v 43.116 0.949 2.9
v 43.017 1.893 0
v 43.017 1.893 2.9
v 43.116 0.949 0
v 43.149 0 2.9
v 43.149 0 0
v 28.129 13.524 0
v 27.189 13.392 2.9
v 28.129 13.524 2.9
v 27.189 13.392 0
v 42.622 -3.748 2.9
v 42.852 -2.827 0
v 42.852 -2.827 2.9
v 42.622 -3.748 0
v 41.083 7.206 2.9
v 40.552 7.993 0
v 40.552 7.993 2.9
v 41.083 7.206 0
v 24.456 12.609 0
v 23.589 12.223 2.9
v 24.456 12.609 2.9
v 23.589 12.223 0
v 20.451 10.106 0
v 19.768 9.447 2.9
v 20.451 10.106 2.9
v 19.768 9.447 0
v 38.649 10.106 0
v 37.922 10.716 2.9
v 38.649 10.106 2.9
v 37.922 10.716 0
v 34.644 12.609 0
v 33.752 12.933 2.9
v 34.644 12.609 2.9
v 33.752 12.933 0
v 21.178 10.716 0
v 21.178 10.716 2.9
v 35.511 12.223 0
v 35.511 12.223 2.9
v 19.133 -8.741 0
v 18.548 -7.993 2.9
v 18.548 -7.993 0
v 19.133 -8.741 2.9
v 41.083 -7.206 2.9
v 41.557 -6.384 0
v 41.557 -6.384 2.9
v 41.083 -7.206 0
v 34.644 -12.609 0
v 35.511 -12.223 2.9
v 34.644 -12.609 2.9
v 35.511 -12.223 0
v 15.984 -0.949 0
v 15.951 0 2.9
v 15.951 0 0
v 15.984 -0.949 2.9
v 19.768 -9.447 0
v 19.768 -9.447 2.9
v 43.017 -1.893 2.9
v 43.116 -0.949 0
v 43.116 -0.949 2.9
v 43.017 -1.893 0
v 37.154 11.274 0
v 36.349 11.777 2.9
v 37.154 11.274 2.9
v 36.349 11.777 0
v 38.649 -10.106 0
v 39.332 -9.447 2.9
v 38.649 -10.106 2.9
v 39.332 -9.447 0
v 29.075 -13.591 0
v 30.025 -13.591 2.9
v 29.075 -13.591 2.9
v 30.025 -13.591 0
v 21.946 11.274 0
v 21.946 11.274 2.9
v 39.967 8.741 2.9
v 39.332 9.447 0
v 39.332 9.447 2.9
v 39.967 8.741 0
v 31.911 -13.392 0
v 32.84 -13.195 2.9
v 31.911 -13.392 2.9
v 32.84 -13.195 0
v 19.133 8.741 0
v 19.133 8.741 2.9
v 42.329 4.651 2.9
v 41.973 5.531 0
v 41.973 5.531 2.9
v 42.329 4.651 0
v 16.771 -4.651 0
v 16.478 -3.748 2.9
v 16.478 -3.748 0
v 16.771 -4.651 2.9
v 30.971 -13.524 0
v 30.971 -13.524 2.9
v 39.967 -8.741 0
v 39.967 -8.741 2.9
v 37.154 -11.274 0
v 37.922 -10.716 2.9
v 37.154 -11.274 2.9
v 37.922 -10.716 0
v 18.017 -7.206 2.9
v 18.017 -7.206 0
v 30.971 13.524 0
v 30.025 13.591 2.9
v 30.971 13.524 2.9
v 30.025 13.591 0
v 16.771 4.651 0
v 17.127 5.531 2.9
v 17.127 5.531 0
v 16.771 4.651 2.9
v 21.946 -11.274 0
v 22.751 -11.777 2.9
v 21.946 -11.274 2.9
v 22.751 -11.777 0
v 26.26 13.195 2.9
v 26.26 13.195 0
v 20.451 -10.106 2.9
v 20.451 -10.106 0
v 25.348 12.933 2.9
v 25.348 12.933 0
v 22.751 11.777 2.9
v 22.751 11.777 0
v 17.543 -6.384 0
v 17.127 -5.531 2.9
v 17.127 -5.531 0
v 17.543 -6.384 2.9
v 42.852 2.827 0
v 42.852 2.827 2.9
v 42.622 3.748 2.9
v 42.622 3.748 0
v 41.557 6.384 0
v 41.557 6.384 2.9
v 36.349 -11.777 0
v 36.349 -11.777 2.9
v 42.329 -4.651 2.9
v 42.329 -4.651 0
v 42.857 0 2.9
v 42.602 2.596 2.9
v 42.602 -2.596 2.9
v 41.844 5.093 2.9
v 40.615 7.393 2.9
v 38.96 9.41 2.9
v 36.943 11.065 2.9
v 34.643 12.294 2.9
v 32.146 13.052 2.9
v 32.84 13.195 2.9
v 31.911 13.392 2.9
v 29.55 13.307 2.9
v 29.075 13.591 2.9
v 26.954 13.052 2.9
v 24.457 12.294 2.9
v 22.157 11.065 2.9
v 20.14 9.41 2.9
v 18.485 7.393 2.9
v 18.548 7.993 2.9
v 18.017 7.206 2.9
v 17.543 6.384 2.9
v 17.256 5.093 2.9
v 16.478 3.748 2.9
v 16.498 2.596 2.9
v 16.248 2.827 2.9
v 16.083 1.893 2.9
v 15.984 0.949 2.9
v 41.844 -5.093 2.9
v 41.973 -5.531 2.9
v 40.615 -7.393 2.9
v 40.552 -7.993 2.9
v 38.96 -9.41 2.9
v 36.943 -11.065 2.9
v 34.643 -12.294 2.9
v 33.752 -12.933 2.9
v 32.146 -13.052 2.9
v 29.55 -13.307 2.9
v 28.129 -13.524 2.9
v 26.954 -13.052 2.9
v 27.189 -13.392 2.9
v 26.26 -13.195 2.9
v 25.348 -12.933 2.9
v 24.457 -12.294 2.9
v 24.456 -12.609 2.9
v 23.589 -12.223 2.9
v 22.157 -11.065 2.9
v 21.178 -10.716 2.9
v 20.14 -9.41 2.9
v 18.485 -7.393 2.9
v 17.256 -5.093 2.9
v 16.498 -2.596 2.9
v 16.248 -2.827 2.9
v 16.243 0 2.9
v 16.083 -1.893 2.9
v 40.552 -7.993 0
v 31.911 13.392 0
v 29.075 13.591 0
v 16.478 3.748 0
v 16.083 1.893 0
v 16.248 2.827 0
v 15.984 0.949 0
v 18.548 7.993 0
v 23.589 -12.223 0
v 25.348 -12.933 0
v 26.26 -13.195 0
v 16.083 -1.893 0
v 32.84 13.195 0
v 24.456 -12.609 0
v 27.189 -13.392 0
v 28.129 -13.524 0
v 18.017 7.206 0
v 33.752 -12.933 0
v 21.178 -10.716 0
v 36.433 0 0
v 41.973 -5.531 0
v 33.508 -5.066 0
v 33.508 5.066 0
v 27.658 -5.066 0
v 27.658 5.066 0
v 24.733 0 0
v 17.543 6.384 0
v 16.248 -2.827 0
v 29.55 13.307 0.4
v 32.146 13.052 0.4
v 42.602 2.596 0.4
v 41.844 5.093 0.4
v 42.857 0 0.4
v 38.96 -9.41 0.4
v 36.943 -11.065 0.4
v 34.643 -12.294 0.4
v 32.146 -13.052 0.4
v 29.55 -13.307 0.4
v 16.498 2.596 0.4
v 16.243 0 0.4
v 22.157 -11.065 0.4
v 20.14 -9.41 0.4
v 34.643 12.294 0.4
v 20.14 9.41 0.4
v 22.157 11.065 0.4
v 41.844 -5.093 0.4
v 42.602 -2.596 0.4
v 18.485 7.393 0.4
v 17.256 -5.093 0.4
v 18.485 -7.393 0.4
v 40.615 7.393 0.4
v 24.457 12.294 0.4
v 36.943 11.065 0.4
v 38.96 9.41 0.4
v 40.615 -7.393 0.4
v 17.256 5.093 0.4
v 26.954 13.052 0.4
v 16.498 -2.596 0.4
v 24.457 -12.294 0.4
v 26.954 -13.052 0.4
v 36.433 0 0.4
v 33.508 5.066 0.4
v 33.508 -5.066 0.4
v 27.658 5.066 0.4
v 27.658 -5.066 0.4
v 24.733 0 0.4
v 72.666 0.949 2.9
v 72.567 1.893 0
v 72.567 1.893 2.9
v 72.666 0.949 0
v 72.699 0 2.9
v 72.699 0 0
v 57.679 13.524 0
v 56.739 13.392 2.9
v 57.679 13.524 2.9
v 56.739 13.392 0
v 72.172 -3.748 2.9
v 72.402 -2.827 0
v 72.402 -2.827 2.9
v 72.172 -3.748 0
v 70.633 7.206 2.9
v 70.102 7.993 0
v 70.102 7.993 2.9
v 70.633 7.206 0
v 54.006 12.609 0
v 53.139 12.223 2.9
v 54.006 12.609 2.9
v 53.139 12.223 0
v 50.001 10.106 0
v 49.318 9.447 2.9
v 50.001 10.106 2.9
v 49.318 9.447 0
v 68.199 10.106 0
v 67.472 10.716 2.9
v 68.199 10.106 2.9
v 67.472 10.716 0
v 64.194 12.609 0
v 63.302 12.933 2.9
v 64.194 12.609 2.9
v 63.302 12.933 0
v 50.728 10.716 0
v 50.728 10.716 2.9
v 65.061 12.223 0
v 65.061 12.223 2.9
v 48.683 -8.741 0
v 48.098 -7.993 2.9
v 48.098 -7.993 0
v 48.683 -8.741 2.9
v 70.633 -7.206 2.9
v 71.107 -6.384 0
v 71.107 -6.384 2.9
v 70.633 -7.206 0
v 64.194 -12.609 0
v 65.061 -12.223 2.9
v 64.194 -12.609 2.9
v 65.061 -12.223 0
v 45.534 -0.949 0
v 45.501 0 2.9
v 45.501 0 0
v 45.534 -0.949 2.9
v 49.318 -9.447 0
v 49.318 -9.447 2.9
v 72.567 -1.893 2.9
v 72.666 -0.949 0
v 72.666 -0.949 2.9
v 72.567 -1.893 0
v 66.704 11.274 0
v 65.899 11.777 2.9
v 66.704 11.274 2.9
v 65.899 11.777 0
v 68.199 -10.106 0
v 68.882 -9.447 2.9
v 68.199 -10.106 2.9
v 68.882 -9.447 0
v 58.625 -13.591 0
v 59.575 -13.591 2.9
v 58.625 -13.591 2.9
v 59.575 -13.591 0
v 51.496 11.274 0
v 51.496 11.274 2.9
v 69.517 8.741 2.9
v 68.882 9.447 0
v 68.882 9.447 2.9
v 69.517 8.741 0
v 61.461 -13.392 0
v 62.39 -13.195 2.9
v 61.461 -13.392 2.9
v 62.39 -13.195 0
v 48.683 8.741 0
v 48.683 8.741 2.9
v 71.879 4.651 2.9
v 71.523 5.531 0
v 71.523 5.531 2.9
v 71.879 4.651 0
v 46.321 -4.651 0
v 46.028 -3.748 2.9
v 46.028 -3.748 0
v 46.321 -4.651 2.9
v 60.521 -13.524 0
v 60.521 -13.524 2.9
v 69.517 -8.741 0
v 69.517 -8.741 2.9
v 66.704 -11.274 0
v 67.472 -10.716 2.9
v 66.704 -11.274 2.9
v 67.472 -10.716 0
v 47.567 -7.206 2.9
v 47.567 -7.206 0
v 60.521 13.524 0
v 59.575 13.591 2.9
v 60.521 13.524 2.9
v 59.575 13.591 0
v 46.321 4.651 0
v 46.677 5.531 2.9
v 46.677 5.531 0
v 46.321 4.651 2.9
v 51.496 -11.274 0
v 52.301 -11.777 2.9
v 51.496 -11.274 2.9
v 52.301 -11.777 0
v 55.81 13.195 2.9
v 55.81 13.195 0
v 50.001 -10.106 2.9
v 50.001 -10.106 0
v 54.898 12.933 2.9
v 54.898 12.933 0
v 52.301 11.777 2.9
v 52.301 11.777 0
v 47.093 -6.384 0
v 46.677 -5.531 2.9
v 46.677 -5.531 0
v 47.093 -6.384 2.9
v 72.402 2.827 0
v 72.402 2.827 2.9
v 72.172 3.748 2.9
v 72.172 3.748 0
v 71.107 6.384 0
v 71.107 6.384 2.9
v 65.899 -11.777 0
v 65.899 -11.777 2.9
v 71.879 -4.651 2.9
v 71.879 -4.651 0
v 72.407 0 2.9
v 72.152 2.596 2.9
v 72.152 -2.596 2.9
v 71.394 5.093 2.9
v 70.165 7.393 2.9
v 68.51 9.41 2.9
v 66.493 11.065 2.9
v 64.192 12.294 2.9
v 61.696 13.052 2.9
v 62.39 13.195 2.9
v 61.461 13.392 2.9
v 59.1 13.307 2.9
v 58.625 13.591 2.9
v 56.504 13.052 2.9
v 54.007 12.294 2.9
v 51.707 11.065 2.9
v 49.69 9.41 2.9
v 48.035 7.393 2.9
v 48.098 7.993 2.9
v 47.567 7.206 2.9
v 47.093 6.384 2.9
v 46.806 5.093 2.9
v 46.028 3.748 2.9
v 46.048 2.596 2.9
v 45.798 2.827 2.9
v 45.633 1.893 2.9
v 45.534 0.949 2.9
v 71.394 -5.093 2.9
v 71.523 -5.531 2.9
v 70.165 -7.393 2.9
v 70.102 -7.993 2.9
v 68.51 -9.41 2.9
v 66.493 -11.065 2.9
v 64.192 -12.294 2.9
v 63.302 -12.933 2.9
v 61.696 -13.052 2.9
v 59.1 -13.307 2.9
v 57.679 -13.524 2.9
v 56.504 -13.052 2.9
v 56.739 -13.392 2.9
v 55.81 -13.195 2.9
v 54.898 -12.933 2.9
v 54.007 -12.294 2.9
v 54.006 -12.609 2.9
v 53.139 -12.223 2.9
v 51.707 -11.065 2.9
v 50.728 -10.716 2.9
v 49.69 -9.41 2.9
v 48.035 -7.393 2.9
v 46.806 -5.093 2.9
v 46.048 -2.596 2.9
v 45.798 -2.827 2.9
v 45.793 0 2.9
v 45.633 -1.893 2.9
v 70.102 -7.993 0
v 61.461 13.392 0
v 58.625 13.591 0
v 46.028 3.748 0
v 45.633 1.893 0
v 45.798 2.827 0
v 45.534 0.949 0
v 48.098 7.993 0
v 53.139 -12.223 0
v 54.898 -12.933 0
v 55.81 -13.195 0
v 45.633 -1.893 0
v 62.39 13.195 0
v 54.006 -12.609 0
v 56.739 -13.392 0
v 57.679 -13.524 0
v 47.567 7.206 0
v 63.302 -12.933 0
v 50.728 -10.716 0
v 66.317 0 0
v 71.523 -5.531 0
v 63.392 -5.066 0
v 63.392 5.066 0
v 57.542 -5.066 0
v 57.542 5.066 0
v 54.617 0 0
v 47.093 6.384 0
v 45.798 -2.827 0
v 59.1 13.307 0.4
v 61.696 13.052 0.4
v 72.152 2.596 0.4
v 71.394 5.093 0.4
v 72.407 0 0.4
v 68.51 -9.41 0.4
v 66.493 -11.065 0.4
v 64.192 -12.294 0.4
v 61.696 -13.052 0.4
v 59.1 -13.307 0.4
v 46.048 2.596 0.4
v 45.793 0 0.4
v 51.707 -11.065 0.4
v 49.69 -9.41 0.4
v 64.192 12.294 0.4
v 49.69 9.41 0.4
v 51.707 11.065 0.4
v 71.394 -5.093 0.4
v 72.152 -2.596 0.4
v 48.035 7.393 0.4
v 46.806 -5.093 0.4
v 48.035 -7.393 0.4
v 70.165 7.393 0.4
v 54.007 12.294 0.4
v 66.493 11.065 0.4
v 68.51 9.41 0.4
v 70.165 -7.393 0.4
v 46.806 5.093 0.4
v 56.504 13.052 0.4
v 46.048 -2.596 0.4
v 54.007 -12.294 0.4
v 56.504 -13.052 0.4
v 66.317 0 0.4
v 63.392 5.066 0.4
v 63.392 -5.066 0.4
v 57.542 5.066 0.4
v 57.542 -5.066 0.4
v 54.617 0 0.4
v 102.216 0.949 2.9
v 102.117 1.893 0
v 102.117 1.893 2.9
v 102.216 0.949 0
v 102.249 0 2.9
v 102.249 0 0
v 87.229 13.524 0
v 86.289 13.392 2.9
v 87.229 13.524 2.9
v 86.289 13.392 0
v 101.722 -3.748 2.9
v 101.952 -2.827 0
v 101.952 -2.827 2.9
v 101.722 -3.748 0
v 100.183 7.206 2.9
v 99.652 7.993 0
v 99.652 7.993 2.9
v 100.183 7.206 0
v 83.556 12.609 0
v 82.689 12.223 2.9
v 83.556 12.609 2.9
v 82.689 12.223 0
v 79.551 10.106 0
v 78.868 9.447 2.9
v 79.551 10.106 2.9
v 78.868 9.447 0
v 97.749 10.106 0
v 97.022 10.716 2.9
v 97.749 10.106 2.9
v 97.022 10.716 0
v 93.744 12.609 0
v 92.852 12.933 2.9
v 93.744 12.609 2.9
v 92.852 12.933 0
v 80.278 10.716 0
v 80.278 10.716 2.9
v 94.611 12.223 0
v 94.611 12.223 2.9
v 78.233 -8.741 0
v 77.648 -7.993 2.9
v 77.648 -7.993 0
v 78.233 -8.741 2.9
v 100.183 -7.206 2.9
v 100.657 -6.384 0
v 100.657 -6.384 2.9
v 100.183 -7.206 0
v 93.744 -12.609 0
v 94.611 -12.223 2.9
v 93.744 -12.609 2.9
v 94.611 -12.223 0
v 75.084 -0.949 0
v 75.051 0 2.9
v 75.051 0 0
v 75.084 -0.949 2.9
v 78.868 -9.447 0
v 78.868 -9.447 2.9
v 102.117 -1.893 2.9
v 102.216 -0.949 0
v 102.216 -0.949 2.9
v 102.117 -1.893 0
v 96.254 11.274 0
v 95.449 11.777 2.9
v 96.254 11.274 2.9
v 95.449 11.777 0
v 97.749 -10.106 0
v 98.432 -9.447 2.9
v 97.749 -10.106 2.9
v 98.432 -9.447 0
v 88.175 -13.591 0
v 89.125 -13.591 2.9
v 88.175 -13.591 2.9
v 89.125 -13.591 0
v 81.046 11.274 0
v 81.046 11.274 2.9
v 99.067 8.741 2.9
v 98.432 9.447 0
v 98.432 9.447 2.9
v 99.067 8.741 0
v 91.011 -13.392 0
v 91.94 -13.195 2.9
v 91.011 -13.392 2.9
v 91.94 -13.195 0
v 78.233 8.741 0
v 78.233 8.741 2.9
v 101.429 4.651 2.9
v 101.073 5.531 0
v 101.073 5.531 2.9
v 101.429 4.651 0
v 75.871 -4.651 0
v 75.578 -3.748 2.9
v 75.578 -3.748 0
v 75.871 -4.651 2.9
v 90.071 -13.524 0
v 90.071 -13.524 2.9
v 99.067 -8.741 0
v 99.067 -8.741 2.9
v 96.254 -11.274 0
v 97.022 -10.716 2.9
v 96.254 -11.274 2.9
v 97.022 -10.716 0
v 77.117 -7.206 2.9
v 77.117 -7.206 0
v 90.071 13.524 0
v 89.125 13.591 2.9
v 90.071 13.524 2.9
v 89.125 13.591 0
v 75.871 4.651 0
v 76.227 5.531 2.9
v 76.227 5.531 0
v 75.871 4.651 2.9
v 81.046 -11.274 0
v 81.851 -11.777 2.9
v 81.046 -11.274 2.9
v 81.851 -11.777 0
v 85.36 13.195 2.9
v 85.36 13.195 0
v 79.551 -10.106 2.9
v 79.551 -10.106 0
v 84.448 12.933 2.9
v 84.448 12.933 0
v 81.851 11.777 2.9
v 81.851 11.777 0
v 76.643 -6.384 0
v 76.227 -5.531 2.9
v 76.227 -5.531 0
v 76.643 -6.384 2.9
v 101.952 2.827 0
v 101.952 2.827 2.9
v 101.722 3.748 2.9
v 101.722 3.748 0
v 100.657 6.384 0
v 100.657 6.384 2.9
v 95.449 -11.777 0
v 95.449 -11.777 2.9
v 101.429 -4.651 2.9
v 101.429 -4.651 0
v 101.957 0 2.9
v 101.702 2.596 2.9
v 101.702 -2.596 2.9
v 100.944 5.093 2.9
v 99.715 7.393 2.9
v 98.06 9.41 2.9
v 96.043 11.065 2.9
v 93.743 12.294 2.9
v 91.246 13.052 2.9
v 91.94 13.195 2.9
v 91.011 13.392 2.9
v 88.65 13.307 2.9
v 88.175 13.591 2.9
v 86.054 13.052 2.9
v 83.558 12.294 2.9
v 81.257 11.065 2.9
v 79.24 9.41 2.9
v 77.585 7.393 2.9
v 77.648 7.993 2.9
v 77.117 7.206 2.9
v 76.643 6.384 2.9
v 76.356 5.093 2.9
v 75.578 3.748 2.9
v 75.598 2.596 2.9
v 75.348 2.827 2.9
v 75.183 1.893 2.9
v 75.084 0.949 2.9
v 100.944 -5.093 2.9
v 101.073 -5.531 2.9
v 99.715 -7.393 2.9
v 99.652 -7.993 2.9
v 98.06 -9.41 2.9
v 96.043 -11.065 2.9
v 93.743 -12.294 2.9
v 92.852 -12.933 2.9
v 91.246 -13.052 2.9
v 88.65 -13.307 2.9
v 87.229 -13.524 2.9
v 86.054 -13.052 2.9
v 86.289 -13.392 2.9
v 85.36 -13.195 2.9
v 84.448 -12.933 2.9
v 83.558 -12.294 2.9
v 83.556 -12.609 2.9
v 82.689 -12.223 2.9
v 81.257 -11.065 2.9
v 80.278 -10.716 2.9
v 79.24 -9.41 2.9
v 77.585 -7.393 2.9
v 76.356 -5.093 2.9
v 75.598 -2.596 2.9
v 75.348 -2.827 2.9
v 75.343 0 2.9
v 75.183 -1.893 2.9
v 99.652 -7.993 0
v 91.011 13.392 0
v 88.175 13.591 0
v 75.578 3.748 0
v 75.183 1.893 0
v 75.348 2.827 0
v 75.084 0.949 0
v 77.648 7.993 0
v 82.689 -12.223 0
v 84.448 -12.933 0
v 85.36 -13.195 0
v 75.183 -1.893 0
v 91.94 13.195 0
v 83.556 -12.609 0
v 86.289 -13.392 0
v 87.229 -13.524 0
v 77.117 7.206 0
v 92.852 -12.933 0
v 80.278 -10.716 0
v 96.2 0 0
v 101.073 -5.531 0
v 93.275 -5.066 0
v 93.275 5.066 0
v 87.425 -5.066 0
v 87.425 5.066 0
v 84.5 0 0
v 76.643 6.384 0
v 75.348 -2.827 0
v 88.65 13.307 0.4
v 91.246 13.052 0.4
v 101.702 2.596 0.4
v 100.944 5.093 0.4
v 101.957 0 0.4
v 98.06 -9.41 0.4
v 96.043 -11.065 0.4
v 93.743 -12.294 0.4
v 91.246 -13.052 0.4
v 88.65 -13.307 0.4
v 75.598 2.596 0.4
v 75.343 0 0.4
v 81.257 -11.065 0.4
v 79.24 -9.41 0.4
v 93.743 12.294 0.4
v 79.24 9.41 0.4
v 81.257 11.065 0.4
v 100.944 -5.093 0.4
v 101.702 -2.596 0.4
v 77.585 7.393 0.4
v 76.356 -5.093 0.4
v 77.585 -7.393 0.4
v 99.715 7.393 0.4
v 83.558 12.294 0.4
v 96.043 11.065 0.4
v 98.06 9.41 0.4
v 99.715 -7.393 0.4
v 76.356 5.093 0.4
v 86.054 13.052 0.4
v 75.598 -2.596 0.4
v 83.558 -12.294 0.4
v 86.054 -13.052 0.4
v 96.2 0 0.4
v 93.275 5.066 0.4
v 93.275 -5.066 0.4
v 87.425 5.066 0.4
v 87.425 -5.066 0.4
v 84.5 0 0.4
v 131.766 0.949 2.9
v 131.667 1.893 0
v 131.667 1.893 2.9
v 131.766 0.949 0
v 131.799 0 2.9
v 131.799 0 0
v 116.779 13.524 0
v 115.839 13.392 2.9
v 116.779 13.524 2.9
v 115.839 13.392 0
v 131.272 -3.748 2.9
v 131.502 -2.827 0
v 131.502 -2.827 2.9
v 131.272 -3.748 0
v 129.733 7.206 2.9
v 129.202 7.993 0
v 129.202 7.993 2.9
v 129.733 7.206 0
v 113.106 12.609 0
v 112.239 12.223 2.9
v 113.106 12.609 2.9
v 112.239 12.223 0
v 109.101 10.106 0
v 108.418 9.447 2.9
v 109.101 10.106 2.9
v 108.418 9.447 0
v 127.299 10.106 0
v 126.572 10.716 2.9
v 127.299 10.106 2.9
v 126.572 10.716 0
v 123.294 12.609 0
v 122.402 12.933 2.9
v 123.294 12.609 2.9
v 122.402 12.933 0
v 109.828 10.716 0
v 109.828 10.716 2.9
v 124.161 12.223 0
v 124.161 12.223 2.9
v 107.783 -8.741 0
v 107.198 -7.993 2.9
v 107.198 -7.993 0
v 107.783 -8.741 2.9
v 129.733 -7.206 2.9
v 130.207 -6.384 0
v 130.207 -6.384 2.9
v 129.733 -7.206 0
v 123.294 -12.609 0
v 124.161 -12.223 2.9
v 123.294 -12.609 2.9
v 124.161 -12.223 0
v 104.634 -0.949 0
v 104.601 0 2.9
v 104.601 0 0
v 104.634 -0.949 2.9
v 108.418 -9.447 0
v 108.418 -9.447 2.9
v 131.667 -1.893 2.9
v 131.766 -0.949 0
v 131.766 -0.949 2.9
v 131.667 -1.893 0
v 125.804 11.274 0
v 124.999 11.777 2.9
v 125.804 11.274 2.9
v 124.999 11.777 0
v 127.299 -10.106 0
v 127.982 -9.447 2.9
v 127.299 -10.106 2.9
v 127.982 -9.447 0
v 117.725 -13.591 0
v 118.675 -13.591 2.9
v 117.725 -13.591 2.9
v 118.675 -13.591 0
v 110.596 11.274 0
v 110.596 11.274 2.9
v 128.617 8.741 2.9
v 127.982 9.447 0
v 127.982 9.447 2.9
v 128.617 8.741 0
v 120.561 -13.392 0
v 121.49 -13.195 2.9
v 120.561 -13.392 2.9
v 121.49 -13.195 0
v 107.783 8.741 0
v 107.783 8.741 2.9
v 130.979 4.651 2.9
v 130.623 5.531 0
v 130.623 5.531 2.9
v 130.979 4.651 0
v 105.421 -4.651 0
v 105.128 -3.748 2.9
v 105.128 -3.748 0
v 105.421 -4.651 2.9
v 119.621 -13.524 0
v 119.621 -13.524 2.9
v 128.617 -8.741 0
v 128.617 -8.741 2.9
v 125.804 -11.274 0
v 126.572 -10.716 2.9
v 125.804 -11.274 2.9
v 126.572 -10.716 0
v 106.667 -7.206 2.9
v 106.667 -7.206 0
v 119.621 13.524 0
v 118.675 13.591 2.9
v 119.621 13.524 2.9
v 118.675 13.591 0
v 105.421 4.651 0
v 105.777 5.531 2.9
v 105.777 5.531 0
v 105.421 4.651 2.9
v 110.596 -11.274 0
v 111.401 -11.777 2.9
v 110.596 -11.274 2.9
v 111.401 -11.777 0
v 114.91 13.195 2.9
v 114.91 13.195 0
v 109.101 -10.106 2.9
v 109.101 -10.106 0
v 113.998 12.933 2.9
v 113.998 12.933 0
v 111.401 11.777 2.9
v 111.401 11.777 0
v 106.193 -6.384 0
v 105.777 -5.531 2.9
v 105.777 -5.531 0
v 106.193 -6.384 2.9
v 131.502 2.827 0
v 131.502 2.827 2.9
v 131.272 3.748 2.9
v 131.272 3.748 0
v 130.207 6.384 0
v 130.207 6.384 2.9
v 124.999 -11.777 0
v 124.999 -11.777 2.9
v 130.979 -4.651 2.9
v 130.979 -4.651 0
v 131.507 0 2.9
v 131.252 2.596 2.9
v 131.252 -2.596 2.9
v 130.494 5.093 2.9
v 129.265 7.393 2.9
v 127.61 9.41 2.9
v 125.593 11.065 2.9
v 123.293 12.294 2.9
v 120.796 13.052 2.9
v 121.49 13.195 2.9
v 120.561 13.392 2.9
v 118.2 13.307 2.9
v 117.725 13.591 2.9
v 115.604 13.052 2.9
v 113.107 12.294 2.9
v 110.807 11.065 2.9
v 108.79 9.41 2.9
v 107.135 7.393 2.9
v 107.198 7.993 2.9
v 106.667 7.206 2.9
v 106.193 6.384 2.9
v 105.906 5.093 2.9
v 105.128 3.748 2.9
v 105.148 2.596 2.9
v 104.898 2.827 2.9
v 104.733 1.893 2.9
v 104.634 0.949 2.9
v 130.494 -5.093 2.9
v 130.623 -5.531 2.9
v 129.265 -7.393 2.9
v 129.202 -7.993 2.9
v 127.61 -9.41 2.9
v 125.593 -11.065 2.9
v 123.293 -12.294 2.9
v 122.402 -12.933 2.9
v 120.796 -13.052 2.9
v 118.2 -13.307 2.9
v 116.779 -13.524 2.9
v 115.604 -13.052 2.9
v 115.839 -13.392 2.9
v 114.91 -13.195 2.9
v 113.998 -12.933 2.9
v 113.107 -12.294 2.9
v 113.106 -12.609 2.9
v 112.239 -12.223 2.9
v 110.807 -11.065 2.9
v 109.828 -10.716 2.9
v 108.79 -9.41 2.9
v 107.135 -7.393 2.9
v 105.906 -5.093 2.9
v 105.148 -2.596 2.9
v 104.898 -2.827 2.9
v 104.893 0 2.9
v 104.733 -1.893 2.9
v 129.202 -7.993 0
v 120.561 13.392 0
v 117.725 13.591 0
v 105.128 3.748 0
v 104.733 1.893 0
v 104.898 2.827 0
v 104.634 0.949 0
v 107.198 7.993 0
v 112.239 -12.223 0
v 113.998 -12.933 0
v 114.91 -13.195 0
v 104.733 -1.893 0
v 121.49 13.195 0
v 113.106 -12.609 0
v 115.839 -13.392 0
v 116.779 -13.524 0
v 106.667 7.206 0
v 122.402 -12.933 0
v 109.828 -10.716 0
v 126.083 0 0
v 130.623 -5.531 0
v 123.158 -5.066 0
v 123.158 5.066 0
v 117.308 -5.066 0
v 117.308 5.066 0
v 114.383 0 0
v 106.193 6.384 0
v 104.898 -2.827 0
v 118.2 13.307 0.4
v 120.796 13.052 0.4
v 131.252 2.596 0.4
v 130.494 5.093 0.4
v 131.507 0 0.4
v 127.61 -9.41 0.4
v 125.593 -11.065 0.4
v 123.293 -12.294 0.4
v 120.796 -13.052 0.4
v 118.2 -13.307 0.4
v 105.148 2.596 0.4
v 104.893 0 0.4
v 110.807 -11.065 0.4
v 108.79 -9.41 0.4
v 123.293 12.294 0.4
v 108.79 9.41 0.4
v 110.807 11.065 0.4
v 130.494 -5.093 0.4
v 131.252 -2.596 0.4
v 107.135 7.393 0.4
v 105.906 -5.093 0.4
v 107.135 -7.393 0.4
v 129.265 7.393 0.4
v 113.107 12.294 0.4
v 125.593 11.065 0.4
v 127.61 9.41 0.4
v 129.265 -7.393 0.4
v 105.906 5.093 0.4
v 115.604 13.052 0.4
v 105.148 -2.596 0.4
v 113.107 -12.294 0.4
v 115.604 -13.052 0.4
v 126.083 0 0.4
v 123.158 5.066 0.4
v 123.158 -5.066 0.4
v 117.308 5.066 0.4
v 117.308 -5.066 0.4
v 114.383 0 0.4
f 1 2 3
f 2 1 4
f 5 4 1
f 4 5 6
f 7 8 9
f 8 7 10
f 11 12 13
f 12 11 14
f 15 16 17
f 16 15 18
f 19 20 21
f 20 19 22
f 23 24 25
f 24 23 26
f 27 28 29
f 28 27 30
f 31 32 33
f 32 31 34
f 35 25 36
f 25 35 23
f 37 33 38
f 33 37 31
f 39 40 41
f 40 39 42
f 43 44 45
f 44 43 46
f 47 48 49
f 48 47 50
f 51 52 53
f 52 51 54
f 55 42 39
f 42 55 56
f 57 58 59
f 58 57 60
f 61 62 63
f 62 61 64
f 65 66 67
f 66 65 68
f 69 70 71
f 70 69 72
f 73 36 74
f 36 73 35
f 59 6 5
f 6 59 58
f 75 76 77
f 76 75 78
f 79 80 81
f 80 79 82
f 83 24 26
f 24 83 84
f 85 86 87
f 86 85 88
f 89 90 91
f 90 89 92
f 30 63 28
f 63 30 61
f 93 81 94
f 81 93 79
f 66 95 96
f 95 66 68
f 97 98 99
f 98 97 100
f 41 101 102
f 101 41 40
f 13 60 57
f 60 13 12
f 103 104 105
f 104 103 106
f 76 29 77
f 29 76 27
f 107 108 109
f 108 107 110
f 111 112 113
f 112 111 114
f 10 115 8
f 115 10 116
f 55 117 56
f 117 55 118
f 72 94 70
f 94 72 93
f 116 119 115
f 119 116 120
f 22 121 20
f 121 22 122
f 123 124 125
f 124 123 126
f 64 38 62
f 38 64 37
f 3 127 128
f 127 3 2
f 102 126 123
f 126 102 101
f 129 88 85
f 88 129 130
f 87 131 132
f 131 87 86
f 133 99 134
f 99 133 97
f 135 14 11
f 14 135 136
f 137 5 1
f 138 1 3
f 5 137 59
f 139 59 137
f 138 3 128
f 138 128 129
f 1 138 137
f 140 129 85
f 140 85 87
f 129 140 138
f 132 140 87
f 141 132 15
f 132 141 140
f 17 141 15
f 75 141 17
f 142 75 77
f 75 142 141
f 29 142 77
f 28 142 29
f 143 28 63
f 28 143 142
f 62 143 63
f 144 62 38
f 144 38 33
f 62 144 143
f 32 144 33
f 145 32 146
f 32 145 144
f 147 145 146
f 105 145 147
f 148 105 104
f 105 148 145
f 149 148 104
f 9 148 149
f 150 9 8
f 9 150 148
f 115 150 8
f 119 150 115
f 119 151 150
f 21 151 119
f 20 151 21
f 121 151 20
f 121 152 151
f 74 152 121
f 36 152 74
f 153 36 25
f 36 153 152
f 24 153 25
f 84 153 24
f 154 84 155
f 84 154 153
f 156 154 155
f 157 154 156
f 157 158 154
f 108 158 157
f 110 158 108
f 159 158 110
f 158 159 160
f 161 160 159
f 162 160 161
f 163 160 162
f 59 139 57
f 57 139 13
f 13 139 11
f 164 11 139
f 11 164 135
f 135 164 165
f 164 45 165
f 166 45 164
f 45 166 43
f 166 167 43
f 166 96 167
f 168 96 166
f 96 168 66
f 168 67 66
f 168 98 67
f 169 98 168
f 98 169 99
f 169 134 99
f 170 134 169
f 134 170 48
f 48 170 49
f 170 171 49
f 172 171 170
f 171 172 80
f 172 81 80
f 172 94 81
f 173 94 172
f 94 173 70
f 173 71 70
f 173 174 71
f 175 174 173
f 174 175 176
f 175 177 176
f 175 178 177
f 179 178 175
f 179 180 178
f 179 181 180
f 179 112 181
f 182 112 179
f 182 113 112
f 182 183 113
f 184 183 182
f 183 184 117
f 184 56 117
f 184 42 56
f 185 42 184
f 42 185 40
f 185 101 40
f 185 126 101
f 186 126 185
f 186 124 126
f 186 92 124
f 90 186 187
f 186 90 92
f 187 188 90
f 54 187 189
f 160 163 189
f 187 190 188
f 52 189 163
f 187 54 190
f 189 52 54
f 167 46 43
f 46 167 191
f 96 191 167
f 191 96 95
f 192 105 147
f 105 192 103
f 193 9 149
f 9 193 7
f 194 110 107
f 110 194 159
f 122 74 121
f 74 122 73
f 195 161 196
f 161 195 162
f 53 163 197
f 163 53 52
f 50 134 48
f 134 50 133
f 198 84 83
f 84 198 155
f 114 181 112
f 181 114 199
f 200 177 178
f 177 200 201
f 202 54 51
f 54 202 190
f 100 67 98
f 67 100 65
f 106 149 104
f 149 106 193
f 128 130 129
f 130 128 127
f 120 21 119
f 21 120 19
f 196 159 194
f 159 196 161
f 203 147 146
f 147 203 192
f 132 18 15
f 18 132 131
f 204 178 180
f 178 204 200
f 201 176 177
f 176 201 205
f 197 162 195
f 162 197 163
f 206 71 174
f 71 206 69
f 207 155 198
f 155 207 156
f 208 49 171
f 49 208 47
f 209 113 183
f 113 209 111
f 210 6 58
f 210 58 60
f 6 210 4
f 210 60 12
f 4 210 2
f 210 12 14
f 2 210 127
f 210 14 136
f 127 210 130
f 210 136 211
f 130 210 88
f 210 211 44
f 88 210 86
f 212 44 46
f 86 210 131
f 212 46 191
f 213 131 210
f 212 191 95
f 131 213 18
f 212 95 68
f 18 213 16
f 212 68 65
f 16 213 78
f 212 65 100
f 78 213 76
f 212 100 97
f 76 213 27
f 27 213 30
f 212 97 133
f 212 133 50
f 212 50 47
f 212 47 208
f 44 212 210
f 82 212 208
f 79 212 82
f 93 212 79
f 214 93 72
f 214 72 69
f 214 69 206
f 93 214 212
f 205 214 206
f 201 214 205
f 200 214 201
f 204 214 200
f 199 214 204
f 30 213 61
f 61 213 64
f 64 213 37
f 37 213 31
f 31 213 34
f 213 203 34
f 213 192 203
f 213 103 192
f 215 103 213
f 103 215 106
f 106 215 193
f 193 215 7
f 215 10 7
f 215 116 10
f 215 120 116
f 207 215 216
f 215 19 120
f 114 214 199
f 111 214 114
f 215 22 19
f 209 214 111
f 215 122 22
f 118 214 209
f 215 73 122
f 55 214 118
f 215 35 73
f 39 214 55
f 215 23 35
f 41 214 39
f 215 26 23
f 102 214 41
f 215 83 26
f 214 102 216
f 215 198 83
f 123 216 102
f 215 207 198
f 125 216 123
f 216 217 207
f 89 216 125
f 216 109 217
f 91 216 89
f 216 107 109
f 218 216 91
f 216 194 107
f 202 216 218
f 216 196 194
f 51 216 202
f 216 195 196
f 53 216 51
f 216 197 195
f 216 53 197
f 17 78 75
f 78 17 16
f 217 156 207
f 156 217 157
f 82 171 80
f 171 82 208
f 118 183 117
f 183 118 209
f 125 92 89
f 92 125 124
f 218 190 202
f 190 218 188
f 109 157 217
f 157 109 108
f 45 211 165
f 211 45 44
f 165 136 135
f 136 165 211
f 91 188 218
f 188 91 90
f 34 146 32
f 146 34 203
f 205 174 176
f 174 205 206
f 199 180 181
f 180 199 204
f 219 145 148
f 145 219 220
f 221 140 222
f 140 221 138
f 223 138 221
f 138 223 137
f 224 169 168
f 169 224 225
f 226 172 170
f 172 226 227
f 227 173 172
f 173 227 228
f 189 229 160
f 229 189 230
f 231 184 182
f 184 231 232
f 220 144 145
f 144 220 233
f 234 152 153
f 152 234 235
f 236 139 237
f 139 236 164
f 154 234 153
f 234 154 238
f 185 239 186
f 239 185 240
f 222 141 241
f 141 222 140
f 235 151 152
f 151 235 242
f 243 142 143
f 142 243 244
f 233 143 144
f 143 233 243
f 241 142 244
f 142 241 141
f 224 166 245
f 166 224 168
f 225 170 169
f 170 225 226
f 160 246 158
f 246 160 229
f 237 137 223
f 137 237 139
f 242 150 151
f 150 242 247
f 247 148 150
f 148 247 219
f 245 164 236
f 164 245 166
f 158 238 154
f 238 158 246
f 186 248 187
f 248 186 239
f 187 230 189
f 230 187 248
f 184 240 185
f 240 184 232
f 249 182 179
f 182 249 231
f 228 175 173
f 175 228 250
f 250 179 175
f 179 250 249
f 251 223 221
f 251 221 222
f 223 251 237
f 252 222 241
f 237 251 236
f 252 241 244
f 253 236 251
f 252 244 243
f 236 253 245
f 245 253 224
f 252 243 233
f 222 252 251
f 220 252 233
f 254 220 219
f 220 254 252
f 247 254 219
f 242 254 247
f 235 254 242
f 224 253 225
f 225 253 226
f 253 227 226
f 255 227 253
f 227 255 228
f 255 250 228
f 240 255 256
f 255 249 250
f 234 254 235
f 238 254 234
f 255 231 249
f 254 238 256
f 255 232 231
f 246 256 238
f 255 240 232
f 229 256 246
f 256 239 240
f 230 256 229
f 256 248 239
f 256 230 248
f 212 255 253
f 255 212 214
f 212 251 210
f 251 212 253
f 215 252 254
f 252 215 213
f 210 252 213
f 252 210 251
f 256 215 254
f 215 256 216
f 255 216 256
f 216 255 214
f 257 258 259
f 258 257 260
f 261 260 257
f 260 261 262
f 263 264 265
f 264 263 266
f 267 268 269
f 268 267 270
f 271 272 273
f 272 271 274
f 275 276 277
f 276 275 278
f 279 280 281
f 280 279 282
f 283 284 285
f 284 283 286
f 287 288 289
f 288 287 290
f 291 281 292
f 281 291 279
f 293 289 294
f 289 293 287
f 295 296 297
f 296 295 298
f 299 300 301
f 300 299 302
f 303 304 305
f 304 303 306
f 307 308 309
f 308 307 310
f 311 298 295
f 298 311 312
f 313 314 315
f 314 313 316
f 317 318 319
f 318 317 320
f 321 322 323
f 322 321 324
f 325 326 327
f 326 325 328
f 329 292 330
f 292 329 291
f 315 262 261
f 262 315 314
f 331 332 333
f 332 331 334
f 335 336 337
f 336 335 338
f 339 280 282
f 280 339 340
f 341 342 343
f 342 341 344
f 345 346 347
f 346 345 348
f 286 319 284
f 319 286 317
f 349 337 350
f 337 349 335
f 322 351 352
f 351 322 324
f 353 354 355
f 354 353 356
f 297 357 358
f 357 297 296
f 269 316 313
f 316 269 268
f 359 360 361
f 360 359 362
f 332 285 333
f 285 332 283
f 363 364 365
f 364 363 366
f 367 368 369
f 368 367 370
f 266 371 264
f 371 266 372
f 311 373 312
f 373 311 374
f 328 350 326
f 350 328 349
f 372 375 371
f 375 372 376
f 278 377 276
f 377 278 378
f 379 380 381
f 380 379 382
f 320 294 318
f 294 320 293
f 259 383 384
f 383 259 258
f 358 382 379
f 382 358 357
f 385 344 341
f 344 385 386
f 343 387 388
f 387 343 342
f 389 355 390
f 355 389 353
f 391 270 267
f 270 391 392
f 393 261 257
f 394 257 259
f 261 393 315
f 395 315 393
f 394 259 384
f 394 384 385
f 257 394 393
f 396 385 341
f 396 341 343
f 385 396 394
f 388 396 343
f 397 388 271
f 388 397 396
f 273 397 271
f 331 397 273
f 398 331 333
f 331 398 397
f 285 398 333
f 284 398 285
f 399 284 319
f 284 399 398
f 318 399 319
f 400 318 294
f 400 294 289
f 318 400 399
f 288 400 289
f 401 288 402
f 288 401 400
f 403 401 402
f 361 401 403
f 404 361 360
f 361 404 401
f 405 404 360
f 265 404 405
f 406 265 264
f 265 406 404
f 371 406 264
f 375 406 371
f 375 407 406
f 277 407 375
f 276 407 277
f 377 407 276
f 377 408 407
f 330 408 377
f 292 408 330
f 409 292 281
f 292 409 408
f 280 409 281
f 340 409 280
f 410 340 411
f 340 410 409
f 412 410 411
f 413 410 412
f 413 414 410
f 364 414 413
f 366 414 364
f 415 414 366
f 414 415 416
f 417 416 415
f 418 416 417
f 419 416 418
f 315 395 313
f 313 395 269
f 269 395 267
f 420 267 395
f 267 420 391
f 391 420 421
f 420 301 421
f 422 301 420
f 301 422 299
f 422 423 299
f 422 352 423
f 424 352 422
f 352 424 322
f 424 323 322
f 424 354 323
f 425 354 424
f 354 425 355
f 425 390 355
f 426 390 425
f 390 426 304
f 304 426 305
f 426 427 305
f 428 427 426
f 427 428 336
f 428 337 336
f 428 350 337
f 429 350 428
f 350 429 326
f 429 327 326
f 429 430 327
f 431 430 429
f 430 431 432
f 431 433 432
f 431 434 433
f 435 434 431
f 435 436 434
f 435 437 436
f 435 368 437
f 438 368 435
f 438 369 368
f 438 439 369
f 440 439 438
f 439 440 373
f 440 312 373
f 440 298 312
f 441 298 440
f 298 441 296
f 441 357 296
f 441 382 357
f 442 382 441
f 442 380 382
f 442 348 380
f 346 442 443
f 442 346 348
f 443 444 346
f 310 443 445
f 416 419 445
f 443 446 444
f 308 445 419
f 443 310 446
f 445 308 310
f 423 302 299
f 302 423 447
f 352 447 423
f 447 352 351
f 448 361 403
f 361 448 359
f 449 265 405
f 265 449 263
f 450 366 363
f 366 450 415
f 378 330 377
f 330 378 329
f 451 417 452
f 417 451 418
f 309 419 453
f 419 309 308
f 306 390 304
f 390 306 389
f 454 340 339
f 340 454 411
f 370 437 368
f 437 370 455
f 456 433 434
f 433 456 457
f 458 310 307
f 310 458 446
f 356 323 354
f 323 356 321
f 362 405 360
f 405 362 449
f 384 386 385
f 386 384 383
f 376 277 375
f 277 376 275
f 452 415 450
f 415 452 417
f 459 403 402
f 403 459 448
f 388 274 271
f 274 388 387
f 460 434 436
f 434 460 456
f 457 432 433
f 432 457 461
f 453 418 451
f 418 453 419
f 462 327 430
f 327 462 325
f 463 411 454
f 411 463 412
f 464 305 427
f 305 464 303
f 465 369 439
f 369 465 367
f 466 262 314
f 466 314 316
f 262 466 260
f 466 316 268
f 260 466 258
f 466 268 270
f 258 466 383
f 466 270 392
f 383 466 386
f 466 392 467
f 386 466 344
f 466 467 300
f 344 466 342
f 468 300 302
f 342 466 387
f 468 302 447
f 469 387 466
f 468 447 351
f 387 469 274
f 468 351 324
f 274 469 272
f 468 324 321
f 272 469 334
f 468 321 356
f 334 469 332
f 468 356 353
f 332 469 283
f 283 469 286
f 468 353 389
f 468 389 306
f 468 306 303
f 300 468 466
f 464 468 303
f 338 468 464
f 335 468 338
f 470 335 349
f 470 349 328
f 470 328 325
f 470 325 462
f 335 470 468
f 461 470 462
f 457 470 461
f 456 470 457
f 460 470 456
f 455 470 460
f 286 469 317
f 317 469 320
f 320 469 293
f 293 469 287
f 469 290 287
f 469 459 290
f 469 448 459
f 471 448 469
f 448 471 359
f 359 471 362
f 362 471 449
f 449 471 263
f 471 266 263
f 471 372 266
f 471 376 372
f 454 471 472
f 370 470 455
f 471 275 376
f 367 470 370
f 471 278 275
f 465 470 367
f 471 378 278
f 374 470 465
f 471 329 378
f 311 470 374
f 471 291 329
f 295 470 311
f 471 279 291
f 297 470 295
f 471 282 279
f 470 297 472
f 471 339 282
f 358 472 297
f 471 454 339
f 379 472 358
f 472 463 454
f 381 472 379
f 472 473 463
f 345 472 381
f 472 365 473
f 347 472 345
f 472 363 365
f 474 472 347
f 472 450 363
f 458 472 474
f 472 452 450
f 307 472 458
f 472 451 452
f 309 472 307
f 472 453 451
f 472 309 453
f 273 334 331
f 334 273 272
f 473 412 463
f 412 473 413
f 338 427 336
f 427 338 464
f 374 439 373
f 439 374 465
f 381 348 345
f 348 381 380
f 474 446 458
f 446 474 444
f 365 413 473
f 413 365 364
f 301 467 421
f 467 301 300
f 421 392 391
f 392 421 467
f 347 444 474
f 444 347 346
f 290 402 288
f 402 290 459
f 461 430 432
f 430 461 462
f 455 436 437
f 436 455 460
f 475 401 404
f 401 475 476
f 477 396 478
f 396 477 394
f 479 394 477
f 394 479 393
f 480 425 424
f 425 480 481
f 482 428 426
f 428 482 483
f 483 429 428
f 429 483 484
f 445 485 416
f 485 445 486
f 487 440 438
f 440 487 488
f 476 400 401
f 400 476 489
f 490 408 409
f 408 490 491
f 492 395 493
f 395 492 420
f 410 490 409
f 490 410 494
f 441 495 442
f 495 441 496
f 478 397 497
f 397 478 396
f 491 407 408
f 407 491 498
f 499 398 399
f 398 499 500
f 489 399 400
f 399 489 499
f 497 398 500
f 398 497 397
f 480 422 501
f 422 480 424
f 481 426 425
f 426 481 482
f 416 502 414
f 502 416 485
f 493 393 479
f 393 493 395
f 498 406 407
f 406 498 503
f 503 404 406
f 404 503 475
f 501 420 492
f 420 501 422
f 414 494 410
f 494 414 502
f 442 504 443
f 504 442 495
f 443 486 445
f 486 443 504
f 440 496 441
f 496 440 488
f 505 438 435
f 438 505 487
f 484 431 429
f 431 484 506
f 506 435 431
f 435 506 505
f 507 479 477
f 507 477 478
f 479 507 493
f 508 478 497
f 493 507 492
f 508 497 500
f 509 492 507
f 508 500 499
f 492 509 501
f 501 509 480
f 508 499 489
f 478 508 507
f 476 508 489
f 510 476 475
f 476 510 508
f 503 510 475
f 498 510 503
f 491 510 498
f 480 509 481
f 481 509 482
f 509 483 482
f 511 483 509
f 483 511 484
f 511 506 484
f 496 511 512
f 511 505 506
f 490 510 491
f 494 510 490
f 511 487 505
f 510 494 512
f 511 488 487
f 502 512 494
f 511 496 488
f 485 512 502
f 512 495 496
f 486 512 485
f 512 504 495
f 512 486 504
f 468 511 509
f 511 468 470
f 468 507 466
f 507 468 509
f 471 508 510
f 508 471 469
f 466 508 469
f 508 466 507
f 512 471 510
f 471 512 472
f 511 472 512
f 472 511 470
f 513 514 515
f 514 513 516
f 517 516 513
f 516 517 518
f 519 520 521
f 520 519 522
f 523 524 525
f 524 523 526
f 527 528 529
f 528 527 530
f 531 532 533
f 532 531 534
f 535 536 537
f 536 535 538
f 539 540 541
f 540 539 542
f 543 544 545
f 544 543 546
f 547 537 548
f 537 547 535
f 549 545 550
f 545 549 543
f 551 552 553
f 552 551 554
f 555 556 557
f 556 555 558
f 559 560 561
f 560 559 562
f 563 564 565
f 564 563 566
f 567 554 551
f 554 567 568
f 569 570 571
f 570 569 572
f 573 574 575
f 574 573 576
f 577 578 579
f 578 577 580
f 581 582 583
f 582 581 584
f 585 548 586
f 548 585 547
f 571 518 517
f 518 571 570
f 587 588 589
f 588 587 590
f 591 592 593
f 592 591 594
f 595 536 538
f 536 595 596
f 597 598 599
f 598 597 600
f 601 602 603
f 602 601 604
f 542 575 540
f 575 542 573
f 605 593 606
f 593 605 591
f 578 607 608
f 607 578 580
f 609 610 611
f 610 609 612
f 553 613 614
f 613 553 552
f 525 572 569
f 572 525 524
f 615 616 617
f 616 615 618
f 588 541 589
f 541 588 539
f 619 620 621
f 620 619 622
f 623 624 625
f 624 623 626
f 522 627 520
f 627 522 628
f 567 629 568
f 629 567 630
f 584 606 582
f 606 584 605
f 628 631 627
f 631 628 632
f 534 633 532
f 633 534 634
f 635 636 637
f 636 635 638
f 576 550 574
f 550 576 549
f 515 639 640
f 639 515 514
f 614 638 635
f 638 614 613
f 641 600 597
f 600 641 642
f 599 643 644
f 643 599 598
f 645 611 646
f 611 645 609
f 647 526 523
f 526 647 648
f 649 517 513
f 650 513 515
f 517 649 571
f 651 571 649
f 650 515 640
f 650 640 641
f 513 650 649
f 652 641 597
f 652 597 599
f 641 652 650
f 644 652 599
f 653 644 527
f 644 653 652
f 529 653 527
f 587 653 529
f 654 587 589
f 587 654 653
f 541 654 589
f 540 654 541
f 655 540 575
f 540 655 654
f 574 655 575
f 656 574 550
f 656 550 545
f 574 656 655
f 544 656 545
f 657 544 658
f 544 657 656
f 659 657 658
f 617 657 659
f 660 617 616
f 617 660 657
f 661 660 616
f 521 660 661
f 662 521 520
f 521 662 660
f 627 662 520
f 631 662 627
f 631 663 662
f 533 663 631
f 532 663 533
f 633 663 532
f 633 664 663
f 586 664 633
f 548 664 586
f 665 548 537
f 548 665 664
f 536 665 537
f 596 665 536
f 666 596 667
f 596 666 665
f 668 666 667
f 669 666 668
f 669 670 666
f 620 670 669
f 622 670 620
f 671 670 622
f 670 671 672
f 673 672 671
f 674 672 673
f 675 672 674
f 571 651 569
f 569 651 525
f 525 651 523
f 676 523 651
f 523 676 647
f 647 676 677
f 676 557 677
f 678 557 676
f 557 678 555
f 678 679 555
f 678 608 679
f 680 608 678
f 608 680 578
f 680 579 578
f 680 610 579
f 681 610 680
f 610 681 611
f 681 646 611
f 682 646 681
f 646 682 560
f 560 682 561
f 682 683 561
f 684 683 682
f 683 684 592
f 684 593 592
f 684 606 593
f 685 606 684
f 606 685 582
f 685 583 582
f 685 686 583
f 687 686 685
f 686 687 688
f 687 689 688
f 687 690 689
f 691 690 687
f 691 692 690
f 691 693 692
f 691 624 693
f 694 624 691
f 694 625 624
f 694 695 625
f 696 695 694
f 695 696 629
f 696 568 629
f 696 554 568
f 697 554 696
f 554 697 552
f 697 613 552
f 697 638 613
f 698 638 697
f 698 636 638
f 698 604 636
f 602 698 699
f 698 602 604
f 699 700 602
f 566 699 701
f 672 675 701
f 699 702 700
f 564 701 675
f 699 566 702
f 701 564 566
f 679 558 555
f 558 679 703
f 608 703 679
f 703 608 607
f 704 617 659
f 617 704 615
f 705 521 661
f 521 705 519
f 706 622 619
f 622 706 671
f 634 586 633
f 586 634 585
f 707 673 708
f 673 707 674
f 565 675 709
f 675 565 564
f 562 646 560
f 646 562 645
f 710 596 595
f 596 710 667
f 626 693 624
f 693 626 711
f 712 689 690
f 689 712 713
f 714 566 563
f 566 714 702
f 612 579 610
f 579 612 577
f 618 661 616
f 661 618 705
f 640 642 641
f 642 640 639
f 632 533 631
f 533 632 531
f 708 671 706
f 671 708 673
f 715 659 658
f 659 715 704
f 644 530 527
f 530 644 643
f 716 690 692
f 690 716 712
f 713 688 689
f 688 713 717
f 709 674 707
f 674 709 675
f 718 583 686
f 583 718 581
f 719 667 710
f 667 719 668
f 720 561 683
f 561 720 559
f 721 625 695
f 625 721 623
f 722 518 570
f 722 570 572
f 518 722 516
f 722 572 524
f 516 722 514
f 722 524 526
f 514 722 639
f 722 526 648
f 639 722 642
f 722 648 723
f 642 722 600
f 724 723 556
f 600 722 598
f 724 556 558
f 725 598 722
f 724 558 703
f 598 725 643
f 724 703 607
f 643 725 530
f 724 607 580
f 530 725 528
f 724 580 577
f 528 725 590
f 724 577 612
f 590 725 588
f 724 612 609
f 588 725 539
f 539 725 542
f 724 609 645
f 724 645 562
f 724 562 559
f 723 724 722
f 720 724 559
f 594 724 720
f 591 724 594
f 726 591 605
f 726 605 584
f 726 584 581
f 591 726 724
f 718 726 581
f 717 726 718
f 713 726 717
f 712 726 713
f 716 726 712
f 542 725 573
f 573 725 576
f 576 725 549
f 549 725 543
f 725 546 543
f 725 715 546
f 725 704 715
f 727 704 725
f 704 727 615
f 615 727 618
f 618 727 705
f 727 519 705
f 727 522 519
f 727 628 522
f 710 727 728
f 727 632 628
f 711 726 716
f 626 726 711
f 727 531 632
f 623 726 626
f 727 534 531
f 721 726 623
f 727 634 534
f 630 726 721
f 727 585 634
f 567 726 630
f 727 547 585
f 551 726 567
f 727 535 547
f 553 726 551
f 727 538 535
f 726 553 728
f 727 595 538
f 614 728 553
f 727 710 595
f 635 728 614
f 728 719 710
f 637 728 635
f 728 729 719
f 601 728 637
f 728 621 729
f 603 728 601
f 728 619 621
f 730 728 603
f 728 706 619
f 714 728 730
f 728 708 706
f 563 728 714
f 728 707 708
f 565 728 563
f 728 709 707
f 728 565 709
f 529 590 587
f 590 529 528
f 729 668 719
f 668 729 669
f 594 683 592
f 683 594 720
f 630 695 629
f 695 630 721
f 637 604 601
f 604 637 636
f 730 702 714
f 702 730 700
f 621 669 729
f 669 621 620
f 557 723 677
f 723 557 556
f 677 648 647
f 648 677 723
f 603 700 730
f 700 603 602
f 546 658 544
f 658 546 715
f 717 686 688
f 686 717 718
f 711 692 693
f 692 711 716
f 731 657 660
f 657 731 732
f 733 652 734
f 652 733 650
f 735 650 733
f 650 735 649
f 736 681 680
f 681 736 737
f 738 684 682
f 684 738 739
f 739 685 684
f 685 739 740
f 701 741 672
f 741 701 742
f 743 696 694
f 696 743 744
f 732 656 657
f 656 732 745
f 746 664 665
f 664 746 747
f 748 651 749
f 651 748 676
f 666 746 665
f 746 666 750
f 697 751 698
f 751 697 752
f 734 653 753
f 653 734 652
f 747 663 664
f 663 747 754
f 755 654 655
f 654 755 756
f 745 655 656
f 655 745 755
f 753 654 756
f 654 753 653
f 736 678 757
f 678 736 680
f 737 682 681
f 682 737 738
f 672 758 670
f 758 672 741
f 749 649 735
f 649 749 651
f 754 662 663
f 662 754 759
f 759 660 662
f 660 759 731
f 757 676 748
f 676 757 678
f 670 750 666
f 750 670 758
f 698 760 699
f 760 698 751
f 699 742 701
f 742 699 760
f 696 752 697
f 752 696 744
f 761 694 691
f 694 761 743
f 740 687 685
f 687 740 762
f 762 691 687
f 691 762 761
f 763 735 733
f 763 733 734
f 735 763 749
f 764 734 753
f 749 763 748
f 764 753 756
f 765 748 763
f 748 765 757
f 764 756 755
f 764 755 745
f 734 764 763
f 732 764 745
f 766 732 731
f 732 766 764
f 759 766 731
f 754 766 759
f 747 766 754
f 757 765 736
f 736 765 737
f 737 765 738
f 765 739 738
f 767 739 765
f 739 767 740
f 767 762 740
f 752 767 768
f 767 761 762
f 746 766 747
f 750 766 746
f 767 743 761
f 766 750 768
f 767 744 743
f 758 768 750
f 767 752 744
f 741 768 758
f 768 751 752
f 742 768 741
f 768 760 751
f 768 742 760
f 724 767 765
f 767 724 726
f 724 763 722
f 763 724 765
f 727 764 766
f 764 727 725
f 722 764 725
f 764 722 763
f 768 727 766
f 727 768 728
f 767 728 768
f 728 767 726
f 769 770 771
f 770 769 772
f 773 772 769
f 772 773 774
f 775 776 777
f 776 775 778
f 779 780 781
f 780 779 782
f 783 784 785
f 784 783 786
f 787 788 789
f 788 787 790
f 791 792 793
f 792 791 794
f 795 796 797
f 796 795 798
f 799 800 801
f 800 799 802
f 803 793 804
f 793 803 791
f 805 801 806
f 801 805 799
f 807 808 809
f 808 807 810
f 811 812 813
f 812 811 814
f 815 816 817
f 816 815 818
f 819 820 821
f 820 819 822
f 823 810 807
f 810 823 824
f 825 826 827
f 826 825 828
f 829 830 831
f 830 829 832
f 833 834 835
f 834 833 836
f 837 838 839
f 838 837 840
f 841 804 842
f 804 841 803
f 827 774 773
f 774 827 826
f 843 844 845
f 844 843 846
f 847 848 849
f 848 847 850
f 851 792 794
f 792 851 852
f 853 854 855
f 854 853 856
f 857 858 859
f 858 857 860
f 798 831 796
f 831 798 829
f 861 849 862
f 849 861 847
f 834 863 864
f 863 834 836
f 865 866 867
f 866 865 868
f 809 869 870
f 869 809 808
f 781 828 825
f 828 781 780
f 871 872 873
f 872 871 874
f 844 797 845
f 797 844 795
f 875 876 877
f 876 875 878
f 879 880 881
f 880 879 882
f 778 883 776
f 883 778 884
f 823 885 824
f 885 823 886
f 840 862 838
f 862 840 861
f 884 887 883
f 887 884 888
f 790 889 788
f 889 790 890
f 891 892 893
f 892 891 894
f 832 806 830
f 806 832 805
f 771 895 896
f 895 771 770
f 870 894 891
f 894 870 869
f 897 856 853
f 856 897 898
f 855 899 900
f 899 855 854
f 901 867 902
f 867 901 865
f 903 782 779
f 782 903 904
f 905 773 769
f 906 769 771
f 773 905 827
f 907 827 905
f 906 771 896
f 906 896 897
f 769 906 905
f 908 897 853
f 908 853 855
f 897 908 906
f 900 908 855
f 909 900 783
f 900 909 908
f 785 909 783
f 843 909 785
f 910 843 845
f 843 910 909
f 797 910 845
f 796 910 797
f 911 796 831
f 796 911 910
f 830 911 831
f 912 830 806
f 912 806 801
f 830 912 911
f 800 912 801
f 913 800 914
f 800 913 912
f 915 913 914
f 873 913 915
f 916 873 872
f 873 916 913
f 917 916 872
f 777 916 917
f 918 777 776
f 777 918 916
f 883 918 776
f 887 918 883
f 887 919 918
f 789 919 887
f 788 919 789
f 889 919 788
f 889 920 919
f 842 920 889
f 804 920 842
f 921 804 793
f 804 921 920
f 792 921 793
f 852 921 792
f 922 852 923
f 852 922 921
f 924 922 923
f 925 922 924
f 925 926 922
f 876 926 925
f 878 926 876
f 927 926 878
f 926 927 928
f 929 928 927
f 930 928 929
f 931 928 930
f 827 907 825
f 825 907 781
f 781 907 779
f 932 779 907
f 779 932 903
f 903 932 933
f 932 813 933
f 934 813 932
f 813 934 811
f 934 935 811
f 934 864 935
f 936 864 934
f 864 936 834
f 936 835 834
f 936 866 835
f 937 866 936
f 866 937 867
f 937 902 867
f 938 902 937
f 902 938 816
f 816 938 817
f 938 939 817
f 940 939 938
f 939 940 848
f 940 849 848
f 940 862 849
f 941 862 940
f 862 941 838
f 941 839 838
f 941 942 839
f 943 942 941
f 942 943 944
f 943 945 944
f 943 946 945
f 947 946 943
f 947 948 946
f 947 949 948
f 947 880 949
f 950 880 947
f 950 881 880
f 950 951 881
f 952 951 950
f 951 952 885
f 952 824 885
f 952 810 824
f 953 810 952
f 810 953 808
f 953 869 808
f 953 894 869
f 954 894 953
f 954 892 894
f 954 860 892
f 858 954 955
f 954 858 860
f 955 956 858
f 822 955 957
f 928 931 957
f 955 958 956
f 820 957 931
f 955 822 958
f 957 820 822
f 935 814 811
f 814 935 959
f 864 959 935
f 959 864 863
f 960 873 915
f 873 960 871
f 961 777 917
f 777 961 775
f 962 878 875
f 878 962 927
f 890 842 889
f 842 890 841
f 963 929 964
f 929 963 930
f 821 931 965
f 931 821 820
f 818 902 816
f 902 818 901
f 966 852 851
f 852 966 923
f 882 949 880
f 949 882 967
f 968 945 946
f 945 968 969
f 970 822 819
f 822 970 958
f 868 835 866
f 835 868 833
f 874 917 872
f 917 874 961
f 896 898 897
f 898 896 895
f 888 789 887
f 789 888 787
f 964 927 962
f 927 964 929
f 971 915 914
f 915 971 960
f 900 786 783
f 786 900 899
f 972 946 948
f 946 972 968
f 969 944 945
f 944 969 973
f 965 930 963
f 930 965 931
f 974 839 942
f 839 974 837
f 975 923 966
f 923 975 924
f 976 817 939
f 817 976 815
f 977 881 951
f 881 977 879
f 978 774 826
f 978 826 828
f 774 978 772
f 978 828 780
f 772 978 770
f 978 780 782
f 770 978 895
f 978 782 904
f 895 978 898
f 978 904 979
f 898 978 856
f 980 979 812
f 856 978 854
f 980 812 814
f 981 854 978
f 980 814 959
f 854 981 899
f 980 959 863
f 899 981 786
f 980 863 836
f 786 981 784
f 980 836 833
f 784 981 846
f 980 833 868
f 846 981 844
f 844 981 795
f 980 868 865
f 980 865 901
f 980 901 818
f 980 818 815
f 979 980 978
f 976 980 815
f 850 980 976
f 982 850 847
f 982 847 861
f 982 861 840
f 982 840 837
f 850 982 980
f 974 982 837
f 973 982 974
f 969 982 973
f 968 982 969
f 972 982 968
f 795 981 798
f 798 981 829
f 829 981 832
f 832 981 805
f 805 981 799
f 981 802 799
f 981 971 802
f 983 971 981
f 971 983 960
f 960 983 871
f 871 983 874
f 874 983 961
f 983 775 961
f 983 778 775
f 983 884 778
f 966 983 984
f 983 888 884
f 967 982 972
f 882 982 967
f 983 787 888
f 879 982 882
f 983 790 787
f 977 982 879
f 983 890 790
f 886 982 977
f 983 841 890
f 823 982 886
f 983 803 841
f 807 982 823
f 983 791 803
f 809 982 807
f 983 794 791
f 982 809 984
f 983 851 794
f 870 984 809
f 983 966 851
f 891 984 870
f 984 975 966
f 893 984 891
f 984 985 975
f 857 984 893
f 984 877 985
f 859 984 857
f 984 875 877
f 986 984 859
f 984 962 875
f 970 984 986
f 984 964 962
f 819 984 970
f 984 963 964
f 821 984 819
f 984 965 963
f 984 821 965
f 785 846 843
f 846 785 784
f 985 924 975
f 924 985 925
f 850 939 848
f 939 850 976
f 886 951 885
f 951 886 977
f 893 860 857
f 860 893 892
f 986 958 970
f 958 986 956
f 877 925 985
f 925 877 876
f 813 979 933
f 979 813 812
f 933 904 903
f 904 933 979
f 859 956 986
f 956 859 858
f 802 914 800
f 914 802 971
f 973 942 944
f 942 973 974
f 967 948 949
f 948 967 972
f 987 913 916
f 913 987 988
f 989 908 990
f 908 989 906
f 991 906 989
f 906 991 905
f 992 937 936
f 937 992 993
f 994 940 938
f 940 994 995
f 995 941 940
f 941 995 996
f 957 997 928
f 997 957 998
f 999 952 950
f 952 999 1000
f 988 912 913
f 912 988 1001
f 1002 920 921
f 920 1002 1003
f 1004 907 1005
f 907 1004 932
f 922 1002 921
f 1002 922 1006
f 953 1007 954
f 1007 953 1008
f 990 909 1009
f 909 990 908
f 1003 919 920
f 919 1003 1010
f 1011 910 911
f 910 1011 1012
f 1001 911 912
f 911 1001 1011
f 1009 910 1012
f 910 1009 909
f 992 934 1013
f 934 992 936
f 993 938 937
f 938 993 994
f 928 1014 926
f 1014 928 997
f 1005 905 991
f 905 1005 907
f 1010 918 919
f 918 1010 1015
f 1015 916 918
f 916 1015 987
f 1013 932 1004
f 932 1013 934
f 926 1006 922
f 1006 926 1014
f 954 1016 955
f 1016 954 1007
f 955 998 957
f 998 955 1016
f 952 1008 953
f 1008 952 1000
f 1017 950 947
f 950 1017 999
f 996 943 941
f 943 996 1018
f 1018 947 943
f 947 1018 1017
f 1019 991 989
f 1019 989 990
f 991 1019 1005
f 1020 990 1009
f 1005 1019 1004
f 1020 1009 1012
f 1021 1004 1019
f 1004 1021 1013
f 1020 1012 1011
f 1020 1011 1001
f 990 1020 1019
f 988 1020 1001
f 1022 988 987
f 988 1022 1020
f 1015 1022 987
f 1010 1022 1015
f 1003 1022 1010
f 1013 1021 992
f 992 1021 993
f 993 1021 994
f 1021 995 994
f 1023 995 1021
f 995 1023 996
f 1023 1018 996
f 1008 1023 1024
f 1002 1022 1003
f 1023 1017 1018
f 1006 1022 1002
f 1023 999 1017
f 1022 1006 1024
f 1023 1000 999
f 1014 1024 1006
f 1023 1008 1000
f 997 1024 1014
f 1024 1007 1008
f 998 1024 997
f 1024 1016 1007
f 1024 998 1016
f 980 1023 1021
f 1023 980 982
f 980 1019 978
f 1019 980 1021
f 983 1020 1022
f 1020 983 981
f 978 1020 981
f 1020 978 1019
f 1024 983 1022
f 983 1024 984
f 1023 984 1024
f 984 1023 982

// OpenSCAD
// Program:    20mm_washer_cap_skewed.scad
//
// Function: OpenSCAD program to define a plastic washer cap for
//           3D-print. The placement of the nut is skewed off
//           center for the washer.
//
// Author:   Kjell Arne Rekaa (kjell.arne.rekaa@gmail.com)
// 
// Date:     2024-05-23
// ======================================================================

// Speed up rendering - low resolution only for preview: 
$fn = $preview ? 32 : 90; 

count      = 4;              // Number of caps
hole_diam  = 10;
wash_size  = 19.7;           // Washer size in millimeter
distance   = 1.50;           // Distance factor between caps
wash_hight = 2.9;             // Hight for the nut/bolt head
friction   = 1.170;          // Friction factor. Higher: less friction
cyl_thick  = 1.18;           // Cylinder thickness: 1.28 > 1.30
size = wash_size * friction; // Will give right friction


// hexagon carving to fit on a nut or bolt head
module washer(size, height=wash_hight){
    cylinder(h=height, d=size/cos(180/6),center=true, $fn=32);
}

// Produce "count" number of equal caps:
for (i = [1:1:count]) {
  translate([i*distance*wash_size,0,0]) { 
  
    difference() {
      union() {
        difference(){
            cylinder(h=wash_hight, d=size*cyl_thick);
            washer(size, wash_hight+5);
        }
        cylinder(h=wash_hight-2.5, d=size*cyl_thick);
      }
      translate([0.7+i/3,0,0]) // Skew the center a little more for each
      cylinder(h=wash_hight+6, d=hole_diam*friction, $fn=6);
    }
  }
}
